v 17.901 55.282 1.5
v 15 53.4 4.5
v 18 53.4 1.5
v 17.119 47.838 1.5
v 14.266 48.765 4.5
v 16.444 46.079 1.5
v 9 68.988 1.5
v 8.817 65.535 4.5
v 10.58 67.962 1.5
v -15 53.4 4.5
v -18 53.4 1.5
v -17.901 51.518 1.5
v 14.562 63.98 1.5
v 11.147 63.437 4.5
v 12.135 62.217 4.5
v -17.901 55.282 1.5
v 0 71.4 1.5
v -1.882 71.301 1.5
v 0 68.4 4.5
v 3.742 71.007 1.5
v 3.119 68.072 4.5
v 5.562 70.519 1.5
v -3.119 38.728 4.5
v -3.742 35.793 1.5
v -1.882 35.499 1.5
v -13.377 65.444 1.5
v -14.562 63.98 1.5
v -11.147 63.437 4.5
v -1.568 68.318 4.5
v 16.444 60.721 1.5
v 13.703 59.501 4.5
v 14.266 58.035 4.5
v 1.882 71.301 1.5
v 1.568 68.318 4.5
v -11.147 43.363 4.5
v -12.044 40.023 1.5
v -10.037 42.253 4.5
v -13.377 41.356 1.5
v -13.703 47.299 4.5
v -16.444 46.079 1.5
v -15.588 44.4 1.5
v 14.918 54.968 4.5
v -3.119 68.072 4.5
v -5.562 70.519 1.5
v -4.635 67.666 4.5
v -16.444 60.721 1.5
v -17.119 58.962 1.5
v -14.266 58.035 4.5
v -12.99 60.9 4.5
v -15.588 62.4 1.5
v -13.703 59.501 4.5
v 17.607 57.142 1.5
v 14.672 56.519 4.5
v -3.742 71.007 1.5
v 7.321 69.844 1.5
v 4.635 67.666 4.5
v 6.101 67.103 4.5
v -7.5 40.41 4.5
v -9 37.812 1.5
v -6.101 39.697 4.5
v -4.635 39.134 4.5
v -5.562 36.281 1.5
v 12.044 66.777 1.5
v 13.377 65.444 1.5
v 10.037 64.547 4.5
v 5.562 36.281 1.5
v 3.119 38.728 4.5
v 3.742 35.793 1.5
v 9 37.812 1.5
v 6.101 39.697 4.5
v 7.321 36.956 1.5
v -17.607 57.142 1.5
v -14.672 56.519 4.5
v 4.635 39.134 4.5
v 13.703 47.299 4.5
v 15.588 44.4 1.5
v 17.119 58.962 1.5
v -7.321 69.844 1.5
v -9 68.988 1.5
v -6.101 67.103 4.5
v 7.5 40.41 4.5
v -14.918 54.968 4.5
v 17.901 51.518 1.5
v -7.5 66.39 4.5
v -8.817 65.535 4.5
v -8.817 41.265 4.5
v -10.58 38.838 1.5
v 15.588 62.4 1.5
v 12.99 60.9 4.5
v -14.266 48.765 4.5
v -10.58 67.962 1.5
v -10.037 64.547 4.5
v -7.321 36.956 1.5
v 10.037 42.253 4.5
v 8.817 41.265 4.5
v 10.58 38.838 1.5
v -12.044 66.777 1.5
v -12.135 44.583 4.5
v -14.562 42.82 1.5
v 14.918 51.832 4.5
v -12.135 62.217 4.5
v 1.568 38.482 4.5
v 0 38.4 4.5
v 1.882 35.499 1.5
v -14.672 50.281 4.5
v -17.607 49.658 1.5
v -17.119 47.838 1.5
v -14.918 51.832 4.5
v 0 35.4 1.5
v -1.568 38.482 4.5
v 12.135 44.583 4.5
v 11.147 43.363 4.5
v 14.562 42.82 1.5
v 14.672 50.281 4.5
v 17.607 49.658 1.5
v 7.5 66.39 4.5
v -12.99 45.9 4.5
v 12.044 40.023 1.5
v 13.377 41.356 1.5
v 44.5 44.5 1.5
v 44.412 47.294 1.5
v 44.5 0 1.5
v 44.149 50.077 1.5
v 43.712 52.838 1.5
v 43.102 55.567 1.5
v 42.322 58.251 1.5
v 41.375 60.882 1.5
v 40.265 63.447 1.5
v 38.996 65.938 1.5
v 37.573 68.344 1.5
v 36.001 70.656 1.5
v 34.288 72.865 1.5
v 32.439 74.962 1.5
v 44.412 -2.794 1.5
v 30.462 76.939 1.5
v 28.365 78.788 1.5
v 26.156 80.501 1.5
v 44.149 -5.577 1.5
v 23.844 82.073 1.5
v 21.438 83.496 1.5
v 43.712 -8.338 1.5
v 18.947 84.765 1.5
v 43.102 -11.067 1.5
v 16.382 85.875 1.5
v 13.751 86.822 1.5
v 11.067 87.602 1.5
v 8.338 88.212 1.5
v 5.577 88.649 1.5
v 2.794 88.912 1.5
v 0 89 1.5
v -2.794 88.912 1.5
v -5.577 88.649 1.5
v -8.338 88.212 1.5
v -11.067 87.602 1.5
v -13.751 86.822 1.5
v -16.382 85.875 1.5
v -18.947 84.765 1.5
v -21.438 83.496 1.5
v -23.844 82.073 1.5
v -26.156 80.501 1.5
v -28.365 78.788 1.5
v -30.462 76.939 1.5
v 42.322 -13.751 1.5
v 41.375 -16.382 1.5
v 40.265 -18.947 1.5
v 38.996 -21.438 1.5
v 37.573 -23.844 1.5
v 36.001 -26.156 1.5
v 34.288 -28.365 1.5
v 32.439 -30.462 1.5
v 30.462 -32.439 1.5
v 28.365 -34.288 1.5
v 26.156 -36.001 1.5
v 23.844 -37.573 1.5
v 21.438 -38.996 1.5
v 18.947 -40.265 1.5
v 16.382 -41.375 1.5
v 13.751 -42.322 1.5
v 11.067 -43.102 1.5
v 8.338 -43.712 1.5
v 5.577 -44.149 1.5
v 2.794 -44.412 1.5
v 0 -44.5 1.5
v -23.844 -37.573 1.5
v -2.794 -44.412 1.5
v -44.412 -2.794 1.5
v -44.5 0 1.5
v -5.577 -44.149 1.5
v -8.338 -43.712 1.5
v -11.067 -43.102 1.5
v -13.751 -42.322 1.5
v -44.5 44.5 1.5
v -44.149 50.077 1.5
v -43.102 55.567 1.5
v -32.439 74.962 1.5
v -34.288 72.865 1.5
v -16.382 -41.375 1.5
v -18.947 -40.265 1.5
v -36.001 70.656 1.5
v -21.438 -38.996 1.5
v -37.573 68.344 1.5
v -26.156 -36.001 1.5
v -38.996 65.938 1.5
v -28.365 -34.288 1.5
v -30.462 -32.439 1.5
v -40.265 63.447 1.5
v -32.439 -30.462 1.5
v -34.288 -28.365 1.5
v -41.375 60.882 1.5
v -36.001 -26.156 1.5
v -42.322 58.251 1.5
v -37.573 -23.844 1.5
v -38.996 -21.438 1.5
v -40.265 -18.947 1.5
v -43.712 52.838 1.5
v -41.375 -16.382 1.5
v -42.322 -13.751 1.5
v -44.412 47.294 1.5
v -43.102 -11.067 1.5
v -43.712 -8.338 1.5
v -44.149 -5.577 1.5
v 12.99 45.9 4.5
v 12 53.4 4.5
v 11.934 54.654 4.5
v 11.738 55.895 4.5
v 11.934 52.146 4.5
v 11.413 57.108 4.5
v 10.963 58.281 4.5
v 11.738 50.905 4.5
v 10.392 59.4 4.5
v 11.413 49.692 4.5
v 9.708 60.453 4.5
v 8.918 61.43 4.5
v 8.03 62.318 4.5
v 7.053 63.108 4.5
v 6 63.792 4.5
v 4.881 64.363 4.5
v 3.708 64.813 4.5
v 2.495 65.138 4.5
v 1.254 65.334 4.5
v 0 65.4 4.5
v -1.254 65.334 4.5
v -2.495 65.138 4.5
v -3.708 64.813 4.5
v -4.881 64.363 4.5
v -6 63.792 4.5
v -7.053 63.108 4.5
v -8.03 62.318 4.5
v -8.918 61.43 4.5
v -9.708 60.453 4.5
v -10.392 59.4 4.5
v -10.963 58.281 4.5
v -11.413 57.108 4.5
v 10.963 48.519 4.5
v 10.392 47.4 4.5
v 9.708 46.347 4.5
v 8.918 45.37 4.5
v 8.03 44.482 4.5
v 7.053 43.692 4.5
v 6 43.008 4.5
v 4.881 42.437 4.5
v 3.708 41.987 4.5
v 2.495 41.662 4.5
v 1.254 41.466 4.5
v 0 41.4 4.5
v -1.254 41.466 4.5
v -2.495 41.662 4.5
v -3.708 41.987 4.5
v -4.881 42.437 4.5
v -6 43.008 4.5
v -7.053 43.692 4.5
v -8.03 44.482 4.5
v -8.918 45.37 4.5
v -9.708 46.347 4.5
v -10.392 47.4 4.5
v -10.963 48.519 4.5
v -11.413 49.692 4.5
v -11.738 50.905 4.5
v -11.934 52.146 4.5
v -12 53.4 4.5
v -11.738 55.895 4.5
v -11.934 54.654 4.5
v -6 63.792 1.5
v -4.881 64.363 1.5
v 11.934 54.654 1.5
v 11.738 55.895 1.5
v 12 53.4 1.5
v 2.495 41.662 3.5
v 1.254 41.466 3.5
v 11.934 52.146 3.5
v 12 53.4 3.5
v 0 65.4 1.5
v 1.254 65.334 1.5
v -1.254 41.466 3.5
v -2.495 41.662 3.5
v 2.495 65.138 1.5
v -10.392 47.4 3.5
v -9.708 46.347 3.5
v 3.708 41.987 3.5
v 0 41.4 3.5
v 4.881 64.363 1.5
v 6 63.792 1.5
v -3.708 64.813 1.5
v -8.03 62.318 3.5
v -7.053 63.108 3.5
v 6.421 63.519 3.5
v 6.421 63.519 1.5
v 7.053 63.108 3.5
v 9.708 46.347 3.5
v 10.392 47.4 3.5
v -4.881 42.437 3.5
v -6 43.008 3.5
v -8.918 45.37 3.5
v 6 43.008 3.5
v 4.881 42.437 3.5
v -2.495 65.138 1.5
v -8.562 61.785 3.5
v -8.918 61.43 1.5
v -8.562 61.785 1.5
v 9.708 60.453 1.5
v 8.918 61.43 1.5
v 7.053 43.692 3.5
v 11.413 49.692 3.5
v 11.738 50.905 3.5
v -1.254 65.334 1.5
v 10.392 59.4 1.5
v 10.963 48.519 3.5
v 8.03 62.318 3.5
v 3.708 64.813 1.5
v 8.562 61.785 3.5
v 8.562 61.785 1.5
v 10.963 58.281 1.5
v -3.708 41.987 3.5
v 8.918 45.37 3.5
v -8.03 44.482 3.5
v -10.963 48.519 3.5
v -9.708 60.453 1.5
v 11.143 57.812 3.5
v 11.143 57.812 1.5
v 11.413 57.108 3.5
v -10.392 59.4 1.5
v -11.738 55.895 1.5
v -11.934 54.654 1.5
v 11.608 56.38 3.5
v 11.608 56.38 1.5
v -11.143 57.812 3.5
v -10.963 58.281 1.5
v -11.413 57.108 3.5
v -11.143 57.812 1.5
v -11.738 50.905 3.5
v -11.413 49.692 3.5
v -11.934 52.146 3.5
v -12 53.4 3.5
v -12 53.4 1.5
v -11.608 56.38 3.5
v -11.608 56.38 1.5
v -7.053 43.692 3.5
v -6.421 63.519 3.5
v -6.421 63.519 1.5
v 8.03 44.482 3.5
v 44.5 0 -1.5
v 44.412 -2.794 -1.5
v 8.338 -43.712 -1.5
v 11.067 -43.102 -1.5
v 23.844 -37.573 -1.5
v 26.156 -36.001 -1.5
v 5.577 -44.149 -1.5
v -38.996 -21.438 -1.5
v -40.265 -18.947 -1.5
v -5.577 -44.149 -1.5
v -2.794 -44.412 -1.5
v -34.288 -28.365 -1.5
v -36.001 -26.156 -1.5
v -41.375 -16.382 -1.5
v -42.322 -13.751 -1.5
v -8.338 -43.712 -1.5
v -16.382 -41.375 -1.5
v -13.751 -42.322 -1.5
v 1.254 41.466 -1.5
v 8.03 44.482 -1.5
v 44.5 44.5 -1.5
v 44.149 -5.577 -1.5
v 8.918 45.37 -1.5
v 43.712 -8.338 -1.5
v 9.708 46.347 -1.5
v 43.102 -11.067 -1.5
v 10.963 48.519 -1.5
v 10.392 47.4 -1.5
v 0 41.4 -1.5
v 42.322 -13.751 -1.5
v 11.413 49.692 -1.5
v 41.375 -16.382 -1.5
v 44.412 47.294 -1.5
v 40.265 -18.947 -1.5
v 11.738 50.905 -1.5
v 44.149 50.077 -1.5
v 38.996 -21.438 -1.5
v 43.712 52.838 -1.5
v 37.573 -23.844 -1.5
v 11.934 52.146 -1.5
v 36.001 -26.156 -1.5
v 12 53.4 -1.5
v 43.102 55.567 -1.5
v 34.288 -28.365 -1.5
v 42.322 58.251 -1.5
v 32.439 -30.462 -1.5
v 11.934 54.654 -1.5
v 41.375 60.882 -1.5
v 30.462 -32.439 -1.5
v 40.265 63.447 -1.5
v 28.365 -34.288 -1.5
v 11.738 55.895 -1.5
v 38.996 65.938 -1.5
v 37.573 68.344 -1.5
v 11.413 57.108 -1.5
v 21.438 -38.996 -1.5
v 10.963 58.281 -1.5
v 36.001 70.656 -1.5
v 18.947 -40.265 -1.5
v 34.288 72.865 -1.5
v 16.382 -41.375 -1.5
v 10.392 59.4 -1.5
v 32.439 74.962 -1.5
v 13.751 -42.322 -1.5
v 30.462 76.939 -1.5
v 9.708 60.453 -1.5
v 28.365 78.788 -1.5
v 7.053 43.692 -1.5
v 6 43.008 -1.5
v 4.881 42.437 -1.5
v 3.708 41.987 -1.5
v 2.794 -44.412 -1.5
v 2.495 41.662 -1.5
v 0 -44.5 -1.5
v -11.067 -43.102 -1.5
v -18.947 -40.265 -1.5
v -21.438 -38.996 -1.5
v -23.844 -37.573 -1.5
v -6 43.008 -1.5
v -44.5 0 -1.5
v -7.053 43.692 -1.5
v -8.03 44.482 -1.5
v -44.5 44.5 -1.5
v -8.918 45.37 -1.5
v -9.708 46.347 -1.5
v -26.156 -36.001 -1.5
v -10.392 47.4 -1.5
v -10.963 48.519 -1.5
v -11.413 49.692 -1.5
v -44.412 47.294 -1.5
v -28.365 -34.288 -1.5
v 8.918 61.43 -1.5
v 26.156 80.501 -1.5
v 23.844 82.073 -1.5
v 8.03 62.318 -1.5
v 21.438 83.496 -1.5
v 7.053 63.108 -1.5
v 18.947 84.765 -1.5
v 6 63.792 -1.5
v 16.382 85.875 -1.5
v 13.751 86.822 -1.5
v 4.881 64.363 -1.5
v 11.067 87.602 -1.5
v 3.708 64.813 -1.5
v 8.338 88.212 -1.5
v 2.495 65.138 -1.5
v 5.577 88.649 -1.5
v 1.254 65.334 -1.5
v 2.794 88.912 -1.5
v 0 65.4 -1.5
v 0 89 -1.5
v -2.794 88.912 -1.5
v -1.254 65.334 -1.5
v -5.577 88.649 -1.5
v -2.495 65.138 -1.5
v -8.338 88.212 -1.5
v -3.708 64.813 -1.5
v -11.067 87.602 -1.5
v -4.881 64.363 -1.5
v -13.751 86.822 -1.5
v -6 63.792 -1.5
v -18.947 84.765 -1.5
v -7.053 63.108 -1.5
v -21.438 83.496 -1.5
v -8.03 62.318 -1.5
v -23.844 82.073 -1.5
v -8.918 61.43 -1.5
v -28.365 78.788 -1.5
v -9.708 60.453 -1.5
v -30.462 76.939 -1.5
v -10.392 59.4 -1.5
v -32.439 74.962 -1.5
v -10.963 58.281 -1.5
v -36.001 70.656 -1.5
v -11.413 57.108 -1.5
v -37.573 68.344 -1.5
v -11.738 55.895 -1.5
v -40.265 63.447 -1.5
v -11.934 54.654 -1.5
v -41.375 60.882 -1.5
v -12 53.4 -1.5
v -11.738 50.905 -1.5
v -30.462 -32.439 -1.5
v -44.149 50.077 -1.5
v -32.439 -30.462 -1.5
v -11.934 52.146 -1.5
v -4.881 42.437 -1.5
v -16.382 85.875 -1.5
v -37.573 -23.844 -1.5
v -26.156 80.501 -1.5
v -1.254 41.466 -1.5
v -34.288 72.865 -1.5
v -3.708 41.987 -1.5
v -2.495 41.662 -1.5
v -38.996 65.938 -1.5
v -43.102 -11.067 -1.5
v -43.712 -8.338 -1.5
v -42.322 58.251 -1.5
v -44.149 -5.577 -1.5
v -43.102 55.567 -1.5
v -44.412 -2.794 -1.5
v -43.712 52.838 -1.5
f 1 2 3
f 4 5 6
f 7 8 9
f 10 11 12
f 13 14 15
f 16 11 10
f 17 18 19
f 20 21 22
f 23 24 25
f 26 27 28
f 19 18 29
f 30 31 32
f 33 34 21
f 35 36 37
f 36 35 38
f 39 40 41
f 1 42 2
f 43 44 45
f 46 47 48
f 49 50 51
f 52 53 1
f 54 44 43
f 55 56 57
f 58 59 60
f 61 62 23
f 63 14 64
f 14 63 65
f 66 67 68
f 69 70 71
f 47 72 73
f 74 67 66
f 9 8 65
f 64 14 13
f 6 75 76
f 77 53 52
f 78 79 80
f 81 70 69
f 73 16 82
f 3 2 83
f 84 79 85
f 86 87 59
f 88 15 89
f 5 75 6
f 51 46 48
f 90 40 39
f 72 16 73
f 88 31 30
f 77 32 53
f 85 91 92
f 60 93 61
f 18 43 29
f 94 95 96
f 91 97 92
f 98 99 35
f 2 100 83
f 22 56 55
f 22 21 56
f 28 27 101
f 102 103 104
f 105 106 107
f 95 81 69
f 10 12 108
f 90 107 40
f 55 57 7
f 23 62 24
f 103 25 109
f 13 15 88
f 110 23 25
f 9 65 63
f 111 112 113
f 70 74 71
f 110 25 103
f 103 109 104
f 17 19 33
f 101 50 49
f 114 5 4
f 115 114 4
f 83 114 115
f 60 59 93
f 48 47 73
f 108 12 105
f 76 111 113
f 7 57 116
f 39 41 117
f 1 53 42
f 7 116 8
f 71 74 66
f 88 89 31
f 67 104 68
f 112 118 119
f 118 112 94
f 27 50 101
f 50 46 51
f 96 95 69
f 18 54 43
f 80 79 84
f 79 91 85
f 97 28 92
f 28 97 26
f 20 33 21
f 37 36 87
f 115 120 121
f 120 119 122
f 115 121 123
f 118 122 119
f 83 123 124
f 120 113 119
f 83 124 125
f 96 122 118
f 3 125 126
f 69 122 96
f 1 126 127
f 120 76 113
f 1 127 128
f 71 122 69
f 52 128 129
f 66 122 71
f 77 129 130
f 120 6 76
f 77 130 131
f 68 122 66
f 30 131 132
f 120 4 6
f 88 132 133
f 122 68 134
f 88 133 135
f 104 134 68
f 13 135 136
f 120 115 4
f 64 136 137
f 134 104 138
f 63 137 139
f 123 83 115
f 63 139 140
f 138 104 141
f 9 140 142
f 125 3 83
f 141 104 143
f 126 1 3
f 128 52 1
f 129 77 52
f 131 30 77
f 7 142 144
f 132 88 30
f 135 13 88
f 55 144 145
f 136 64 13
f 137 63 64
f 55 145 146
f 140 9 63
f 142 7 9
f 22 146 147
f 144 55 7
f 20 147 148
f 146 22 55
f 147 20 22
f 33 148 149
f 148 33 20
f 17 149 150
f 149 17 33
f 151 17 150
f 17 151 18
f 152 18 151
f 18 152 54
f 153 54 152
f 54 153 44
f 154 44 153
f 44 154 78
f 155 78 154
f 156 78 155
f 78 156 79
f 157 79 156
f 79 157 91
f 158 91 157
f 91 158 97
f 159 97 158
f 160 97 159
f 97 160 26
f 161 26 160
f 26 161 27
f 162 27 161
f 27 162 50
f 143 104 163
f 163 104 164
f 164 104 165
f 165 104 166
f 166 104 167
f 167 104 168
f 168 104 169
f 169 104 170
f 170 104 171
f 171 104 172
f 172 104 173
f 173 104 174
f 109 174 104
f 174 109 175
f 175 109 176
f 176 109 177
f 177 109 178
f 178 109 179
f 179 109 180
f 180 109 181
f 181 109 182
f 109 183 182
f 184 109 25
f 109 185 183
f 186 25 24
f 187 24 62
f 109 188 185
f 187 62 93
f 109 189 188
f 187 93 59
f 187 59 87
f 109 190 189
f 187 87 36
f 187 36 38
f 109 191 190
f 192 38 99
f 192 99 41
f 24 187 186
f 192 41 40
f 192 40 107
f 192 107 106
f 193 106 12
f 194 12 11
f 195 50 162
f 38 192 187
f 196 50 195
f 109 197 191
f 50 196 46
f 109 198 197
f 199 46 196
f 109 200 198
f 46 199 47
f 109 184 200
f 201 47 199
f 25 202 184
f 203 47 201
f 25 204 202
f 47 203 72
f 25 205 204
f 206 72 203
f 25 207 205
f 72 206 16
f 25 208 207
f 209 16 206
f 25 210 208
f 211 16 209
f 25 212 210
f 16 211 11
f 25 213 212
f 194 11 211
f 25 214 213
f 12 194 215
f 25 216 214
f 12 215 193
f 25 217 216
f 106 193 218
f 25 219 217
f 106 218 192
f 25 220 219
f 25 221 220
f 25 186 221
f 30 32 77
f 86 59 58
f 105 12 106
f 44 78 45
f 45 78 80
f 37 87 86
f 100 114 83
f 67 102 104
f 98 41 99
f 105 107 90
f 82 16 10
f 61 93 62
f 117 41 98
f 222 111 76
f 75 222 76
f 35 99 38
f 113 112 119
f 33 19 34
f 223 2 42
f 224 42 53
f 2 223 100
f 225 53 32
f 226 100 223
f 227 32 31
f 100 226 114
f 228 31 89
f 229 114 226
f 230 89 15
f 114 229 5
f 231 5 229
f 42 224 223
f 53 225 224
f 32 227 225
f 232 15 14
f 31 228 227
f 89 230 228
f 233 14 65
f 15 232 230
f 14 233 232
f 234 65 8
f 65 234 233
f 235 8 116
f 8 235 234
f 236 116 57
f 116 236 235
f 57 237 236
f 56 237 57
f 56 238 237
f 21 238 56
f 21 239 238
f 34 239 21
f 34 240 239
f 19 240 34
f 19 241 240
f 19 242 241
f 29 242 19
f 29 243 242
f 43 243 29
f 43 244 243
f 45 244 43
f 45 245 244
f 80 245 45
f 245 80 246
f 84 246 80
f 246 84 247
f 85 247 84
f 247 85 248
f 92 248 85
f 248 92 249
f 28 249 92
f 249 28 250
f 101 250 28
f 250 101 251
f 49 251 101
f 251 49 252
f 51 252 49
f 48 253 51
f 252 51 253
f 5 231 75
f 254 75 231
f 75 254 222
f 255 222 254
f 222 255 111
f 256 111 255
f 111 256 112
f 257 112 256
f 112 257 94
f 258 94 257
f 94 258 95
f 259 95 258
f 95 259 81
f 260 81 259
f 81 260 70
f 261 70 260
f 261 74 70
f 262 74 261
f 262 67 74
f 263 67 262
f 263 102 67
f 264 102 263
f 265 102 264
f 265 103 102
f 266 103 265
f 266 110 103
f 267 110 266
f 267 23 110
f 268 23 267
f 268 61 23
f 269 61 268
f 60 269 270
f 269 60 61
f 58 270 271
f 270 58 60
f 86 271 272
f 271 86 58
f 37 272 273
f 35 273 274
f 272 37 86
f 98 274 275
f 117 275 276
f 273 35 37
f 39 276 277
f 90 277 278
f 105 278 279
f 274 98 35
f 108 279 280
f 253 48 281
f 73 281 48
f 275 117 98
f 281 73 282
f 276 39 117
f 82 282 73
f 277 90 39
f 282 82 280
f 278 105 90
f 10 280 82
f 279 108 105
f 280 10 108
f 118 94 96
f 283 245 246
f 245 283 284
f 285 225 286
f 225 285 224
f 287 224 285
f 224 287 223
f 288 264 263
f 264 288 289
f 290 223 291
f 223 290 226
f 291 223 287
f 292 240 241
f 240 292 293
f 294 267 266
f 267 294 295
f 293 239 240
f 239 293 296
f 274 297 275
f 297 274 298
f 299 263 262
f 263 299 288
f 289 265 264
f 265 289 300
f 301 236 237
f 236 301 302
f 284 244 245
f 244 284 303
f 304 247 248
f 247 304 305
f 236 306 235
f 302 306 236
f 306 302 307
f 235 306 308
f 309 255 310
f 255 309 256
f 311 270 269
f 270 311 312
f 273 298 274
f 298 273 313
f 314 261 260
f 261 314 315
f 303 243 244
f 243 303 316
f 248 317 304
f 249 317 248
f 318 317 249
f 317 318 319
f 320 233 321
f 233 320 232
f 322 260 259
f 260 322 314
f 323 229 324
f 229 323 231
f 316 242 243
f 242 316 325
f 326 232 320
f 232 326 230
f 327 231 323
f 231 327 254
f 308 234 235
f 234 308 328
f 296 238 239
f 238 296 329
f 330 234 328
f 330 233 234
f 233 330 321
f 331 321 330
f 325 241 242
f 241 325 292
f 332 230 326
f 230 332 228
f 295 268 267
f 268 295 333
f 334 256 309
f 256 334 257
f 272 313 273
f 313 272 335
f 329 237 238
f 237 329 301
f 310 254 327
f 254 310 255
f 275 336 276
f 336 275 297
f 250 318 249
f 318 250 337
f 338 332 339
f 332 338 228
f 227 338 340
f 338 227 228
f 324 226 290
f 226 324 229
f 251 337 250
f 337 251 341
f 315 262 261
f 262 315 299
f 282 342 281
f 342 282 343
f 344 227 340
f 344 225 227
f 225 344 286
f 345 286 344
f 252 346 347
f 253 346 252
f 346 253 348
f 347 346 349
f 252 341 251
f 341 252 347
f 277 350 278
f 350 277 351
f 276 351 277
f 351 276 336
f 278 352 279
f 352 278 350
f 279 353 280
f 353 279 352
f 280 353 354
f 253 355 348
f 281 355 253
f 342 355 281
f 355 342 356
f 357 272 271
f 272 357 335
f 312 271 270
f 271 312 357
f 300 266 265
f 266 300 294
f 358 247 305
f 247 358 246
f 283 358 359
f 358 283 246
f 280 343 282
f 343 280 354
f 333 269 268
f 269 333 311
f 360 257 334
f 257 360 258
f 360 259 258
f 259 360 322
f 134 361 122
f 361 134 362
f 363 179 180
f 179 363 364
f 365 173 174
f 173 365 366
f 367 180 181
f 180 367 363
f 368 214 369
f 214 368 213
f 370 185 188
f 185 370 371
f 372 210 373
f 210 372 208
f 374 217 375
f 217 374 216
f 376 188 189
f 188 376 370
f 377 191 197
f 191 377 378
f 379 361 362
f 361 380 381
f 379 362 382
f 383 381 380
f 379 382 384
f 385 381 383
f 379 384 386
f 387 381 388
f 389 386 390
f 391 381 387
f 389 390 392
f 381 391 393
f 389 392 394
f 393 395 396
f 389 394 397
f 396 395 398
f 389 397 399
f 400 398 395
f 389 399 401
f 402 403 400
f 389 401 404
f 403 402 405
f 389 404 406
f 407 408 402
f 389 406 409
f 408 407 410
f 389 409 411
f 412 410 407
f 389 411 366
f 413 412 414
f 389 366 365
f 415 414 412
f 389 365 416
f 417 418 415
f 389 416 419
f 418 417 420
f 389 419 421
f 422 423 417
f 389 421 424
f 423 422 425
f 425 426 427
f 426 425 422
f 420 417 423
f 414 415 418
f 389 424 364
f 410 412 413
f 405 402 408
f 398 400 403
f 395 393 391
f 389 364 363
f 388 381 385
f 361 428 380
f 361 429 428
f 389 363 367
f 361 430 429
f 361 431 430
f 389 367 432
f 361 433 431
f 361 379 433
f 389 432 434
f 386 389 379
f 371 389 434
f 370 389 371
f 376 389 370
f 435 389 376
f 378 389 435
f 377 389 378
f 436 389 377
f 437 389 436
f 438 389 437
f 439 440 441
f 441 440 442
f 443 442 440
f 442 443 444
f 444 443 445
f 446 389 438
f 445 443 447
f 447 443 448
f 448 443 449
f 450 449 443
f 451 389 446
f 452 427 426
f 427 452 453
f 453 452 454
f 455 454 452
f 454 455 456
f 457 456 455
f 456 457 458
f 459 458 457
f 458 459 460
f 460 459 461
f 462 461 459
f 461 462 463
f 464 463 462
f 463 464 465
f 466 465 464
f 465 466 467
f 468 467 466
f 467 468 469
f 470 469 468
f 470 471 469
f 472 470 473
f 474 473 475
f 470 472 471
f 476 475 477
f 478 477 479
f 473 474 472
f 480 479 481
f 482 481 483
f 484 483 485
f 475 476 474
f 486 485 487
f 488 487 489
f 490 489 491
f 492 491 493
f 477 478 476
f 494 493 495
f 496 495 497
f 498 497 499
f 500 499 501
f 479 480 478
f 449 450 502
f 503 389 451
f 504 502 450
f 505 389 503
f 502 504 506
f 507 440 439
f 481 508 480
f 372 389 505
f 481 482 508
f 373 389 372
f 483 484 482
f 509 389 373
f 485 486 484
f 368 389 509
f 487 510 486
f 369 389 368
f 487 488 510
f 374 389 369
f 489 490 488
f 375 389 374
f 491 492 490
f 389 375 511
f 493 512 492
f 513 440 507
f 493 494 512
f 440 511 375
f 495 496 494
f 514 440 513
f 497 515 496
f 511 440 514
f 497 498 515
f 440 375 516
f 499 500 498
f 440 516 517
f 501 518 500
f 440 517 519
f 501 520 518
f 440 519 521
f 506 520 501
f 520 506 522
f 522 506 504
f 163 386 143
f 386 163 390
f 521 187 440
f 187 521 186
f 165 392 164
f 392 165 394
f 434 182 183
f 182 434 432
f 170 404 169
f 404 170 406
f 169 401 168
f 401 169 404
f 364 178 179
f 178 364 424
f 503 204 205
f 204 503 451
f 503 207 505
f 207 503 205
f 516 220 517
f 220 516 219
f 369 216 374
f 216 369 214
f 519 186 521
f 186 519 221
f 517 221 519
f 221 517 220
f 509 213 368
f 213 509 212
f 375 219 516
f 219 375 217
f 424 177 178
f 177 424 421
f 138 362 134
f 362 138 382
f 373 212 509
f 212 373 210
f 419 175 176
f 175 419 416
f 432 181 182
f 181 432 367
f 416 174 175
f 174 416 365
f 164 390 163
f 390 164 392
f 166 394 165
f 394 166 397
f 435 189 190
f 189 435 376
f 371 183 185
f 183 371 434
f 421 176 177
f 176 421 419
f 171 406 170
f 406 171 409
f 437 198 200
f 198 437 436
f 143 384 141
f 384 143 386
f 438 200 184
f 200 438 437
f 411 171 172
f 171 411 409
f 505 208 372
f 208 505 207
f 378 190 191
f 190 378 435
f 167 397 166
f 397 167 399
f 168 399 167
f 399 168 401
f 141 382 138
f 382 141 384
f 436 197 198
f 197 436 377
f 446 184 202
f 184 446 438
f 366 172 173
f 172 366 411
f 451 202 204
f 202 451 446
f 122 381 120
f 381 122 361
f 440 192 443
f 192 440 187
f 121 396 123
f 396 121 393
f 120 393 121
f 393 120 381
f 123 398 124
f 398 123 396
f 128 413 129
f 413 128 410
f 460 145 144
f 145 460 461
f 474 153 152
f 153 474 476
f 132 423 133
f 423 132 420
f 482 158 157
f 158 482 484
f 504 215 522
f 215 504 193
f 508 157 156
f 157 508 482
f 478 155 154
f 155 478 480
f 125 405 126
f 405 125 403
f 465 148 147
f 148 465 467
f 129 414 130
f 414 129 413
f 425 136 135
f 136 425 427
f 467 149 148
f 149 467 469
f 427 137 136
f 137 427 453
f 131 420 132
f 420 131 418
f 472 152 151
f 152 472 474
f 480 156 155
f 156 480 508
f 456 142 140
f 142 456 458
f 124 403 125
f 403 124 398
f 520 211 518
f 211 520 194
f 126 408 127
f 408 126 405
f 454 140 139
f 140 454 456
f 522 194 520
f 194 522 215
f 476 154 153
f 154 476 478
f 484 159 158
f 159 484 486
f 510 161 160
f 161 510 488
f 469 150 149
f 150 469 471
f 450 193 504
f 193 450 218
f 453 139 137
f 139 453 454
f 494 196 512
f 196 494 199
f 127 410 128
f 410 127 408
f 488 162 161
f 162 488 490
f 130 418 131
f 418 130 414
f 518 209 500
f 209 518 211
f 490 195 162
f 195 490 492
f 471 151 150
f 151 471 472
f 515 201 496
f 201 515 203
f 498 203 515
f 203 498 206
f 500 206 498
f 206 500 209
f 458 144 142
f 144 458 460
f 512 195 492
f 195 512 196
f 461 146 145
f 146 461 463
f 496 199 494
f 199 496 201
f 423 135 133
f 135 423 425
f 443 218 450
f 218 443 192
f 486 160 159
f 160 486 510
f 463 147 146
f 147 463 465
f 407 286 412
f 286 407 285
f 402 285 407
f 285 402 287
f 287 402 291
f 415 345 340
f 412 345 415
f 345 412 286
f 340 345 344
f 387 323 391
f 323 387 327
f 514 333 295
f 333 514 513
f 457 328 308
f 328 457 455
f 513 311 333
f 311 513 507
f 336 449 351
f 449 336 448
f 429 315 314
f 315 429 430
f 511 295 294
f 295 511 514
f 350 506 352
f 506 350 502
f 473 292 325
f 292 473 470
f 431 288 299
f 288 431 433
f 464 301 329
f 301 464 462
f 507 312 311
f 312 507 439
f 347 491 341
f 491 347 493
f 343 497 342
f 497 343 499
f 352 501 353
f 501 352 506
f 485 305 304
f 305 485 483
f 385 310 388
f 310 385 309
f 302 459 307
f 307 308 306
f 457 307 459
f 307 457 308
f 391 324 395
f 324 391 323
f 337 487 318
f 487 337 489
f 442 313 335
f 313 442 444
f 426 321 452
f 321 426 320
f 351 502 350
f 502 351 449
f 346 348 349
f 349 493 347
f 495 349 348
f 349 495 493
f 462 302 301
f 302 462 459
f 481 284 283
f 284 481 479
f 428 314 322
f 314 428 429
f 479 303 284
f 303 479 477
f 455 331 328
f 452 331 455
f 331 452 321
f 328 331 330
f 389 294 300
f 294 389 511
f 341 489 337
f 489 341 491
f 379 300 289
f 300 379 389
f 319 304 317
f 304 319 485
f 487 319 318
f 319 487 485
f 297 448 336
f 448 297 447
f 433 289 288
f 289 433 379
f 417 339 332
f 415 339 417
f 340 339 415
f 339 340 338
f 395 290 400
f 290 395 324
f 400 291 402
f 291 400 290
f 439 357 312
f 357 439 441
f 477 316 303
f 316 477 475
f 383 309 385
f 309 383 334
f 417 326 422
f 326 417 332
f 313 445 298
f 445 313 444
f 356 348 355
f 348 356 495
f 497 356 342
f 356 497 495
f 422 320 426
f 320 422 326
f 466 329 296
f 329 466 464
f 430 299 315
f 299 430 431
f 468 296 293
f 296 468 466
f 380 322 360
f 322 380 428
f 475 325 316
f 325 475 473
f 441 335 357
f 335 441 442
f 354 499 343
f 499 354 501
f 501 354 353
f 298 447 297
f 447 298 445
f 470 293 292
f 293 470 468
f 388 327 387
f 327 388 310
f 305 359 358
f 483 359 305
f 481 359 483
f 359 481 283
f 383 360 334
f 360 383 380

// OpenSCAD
// Sliding Ventilation Cover - Cover Component
// This cover slides in the frame rails to open/close the ventilation hole

// ===== PARAMETERS =====
// Must match frame.scad parameters
cover_size = 95;           // Size of the square cover
wall_thickness = 3;        // Thickness of the cover plate
rail_height = 2;           // Height of rails (from frame)
clearance = 0.25;          // Clearance for smooth sliding

hole_radius = 32.5;
hole_diameter = hole_radius * 2;

overlap = 12;
cover_radius = hole_radius + overlap;
  
// Finger hole in top section
finger_hole_radius = 12;  // ~24mm diameter hole
finger_hole_offset = cover_radius * 1.2;  // Position in top circle area
finger_ring_height = 3;   // Height of raised ring around hole

module cover() {
  difference() {
    union() {
      cylinder(h=wall_thickness, r = cover_radius, $fn=100, center=true);
      // Square plate with side = diameter of cylinder
      translate([0, cover_radius/2, 0])
        cube([cover_radius * 2, cover_radius , wall_thickness], center=true);

      translate([0, cover_radius, 0])
        cylinder(h=wall_thickness, r = cover_radius, $fn=100, center=true);

      // Chamfered ring around finger hole
      translate([0, finger_hole_offset, wall_thickness/2])
        difference() {
          cylinder(h=finger_ring_height, r1=finger_hole_radius+6, r2=finger_hole_radius+3, $fn=60);
          cylinder(h=finger_ring_height+1, r=finger_hole_radius, $fn=60);
        }
    }
    // Finger hole
    translate([0, finger_hole_offset, 0])
      cylinder(h=wall_thickness + finger_ring_height + 1, r = finger_hole_radius, $fn=60, center=true);
  }
}

cover();
